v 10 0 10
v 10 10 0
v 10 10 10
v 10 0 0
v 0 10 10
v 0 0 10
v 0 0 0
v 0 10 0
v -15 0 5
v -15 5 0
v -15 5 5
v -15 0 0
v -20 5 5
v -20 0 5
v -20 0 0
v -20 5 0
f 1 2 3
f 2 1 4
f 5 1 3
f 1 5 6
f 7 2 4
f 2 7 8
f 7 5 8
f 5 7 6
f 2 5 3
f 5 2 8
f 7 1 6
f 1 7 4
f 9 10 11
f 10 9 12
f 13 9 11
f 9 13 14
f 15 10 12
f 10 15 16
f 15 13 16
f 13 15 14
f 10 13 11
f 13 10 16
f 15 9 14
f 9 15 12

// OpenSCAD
//the root tree contains 2 non sense comment(s)

union() {
	color(c = "red") {
		//non sense comment
		cube(size = 10);
	}
	//non sense comment
	translate(v = [-20, 0, 0]) {
		cube(size = 5);
	}
}
